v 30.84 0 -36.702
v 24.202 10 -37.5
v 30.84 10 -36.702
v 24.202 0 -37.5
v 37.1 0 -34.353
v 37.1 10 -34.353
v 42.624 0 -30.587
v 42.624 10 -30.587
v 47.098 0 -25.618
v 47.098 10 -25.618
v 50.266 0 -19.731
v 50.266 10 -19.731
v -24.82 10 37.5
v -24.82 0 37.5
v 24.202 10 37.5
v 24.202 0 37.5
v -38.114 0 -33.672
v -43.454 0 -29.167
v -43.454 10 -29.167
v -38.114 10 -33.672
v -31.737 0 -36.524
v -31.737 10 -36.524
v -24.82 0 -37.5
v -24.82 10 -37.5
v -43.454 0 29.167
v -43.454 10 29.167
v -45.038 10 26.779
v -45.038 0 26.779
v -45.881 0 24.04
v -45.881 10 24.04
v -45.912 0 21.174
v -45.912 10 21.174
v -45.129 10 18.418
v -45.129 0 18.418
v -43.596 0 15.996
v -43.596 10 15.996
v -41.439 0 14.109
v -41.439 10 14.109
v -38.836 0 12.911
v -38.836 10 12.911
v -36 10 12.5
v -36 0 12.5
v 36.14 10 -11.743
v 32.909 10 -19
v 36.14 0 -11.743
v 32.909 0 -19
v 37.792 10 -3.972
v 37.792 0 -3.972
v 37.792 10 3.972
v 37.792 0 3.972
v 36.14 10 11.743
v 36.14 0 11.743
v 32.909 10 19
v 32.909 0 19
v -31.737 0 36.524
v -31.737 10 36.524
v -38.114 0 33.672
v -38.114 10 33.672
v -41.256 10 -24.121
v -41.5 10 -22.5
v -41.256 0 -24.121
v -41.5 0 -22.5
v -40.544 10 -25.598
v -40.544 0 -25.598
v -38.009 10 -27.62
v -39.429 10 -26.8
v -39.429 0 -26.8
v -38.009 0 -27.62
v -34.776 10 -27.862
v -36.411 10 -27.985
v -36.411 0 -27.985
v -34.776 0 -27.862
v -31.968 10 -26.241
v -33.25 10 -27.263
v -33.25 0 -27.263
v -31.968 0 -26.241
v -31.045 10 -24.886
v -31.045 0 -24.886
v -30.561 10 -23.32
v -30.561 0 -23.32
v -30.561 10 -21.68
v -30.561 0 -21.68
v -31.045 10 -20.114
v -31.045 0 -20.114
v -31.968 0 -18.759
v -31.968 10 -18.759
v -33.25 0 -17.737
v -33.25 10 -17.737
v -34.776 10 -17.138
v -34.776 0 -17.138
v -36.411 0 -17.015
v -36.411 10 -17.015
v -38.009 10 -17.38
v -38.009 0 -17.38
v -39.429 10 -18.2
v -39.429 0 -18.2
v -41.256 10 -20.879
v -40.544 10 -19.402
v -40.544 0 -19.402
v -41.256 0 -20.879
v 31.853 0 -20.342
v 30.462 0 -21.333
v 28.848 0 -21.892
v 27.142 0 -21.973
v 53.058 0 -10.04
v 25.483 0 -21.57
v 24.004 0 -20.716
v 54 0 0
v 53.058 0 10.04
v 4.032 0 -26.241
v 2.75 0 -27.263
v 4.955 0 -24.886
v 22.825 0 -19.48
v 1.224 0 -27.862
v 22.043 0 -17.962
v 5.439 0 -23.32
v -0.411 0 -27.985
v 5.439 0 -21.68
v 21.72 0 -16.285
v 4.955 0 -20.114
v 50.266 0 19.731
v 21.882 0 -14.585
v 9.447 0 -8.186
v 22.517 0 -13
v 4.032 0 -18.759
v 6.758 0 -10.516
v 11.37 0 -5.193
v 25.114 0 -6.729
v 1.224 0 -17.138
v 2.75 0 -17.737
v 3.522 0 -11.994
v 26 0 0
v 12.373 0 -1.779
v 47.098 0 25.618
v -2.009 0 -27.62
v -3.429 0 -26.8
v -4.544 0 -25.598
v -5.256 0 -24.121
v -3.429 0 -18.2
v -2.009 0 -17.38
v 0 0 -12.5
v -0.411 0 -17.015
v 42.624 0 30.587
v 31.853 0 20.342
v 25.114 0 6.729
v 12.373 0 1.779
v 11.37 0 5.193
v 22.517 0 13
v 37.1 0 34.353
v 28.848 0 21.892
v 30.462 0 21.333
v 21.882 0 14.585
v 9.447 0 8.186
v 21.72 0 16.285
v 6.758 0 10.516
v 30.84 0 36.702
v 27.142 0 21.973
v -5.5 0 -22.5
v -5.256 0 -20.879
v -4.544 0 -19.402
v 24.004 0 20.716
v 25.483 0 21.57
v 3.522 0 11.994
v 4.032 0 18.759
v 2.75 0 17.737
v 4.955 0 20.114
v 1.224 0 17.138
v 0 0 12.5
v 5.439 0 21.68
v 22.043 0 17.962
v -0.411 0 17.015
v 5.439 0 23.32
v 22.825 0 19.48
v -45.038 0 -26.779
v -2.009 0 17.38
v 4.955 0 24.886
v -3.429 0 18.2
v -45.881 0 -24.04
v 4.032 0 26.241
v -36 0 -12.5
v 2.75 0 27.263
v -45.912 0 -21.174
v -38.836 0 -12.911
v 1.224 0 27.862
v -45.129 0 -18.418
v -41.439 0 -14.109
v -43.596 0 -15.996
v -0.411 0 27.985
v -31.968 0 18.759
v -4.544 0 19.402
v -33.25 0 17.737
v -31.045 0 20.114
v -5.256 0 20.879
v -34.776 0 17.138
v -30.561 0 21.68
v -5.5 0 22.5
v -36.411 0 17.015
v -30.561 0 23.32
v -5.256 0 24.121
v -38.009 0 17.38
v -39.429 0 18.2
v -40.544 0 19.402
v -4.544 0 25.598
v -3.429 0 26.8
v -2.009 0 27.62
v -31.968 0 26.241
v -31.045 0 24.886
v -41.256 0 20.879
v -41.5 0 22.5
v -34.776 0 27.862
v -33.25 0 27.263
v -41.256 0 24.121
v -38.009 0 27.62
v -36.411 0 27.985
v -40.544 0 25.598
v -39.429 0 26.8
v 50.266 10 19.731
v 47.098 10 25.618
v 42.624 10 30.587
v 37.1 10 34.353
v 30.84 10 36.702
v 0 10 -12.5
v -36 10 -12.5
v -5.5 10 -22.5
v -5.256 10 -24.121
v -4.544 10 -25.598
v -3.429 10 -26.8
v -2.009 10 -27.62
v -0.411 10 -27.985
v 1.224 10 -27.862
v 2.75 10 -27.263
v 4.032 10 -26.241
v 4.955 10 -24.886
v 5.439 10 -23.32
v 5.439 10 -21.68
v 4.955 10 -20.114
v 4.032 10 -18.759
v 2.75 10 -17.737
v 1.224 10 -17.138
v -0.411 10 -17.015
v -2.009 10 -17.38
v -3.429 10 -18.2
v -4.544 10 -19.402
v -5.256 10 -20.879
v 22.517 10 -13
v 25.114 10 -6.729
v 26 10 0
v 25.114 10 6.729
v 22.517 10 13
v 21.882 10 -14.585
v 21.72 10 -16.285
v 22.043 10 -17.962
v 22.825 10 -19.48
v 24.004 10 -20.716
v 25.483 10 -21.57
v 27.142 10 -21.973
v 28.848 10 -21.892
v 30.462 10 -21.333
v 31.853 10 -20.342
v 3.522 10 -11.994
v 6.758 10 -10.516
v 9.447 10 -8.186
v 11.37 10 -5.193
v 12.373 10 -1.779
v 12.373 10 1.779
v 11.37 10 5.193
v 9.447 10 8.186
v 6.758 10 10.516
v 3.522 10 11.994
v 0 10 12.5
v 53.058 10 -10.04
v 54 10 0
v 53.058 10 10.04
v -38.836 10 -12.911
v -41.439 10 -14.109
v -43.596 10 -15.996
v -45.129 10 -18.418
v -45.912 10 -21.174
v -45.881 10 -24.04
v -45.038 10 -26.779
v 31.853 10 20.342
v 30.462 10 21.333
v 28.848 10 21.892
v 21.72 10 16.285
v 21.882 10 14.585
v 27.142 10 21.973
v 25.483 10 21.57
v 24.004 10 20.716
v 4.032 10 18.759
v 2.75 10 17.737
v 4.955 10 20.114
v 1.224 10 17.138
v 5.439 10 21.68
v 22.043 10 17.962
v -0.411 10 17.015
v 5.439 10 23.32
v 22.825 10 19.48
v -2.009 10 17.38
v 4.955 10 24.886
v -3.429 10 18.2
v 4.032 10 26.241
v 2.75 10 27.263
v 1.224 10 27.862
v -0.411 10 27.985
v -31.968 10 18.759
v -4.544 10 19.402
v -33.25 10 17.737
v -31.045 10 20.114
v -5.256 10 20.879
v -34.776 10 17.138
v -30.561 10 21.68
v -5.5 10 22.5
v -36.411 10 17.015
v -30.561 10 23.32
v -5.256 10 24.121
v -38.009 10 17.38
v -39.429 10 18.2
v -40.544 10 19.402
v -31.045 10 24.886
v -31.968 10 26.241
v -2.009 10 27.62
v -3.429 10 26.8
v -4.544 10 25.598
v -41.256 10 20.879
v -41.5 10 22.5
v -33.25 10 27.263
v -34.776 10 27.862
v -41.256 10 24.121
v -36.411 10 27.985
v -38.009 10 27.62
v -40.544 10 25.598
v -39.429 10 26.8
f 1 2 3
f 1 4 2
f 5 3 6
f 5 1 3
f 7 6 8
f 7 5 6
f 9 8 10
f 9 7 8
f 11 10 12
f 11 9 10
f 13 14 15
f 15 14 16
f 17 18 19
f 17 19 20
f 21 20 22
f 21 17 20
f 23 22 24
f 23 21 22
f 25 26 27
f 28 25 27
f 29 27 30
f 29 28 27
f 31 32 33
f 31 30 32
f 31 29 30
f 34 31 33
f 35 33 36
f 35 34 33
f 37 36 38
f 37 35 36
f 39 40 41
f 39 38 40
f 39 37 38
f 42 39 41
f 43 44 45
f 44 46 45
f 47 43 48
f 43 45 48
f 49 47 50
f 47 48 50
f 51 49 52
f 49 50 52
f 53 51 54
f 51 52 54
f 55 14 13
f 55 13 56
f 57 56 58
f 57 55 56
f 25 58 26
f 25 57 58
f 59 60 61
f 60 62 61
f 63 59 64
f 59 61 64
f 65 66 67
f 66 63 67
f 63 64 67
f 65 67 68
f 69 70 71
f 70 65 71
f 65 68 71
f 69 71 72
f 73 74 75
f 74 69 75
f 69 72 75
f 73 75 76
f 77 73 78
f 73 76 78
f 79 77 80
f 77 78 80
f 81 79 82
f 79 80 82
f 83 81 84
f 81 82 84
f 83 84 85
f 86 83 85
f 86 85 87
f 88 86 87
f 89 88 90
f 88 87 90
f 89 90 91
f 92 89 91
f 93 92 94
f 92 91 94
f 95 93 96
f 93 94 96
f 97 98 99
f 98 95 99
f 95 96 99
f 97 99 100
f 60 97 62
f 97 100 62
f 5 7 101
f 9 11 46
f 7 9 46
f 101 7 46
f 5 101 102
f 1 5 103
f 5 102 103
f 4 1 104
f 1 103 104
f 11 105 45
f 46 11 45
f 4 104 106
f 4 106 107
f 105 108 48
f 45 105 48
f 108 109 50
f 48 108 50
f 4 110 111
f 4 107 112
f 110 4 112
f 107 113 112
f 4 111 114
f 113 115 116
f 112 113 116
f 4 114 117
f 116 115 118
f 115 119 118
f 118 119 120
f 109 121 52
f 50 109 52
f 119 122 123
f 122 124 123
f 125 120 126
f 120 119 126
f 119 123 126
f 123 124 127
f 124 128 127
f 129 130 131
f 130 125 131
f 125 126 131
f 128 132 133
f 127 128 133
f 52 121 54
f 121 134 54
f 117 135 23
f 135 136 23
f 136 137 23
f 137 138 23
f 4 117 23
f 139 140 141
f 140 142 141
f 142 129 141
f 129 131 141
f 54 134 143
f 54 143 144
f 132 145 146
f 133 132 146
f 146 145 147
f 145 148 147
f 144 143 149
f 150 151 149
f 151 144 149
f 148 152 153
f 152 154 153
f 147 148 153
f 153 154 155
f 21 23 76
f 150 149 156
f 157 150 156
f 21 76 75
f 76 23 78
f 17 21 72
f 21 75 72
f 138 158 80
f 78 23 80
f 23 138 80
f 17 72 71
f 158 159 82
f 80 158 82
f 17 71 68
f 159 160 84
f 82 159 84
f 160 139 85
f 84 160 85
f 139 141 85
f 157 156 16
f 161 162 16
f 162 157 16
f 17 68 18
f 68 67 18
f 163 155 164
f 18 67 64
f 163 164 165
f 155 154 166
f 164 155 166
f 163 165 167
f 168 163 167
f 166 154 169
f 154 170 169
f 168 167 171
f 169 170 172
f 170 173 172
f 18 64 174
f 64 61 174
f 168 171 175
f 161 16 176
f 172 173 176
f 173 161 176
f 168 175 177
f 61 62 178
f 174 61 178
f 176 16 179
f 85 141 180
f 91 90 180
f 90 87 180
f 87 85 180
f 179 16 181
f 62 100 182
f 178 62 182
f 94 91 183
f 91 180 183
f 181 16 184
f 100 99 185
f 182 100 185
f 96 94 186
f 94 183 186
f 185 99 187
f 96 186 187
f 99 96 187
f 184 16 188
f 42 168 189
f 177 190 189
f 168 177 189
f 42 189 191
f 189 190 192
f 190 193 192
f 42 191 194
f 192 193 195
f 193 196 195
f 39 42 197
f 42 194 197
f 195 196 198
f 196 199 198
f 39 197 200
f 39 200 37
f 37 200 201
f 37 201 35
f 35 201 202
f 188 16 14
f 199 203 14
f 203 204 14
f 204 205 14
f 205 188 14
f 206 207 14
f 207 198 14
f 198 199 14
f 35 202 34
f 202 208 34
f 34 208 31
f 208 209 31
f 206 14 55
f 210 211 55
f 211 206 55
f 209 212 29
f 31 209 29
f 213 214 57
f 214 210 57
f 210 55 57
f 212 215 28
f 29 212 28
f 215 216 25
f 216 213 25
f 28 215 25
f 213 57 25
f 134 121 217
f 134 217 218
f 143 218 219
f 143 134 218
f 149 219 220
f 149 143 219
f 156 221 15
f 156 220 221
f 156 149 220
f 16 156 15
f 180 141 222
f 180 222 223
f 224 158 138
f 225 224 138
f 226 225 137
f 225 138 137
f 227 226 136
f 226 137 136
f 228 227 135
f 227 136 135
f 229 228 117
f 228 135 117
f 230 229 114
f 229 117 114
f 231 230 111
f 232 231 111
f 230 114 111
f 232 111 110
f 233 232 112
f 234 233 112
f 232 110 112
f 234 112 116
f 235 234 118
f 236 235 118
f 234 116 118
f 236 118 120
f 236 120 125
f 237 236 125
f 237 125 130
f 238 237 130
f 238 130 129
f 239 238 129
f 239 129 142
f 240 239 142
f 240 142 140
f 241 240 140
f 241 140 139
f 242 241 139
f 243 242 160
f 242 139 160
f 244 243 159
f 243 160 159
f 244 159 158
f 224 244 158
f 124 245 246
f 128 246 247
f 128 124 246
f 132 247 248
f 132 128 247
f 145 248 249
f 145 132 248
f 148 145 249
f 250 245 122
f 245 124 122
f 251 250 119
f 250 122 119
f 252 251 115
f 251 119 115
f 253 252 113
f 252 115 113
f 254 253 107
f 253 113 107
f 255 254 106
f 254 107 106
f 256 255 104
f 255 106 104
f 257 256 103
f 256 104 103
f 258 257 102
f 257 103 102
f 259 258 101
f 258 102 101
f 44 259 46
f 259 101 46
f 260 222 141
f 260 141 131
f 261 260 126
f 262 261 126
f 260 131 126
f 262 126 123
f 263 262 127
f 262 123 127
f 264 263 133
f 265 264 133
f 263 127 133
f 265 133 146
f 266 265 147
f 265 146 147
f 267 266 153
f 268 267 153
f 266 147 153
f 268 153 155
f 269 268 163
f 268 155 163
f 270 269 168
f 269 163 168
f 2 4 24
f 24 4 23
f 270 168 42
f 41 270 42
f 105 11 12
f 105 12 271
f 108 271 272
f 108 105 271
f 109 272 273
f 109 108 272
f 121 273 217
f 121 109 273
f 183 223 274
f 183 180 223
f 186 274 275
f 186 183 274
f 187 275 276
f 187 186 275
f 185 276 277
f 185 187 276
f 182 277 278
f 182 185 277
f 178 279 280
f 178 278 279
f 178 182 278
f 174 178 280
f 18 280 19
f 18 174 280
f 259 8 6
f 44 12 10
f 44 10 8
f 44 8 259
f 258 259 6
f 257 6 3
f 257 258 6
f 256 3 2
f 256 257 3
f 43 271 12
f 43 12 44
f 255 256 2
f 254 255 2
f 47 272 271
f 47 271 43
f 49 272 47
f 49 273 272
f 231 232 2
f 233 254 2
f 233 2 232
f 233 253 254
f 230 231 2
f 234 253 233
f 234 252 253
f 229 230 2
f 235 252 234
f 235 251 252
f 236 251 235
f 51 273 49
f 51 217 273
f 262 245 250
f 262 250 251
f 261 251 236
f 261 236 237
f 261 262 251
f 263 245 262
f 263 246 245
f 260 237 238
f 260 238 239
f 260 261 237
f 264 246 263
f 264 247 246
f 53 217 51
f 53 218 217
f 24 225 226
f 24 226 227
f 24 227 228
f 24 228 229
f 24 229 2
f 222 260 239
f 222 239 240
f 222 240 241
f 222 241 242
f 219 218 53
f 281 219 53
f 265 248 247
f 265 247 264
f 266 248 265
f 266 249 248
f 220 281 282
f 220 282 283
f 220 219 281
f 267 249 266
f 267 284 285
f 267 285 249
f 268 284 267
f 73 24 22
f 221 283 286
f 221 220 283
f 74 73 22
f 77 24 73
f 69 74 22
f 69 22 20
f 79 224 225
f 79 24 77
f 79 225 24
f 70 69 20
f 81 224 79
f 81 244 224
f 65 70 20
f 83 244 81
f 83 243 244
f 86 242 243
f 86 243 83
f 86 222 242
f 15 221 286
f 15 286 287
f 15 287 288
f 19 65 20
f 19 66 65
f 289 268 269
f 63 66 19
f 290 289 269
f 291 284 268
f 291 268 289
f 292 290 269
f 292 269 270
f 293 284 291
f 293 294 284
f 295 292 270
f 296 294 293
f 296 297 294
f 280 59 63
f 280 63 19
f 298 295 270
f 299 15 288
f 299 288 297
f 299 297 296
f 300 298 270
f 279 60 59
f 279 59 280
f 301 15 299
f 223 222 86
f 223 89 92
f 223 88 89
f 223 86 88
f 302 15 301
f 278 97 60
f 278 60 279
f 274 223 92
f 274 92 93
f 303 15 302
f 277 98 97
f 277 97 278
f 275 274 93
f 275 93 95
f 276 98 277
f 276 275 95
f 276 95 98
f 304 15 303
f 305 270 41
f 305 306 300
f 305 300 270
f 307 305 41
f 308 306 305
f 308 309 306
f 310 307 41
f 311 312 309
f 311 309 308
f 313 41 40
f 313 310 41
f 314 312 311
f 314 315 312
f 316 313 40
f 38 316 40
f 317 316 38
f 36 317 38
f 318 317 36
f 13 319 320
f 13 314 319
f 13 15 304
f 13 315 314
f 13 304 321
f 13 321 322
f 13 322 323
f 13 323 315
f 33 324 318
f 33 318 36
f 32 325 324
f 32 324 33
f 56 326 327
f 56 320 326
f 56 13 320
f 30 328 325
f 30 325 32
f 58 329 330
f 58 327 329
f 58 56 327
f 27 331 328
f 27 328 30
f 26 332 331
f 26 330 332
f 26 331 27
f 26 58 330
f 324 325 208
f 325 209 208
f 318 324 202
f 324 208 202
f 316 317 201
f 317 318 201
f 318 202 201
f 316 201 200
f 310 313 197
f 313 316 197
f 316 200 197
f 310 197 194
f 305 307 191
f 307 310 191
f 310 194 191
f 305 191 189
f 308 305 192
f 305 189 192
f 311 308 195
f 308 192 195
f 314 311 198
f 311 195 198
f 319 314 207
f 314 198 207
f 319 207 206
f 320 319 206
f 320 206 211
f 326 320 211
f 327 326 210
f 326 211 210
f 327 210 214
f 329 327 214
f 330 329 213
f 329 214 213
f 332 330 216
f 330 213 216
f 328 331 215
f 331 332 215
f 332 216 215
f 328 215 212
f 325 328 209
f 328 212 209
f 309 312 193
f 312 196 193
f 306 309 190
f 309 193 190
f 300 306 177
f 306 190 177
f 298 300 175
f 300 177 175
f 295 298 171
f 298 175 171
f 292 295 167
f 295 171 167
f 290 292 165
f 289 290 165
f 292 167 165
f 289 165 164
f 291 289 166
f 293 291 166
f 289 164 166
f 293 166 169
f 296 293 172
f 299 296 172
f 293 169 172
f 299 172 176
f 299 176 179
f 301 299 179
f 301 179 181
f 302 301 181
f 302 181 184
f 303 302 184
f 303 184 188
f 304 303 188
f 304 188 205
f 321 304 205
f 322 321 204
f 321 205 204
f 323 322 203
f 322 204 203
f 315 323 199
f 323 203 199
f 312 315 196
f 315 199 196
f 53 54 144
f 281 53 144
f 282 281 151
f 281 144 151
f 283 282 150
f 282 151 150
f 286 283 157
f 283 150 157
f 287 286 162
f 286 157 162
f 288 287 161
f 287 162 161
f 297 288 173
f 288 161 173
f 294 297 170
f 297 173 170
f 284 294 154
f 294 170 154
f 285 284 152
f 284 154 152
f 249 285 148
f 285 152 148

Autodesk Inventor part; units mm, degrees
ref_plane "YZ Plane" through (0, 0, 0) normal (1, 0, 0) x (0, 1, 0)
ref_plane "XZ Plane" through (0, 0, 0) normal (0, 1, 0) x (-1, 0, 0)
ref_plane "XY Plane" through (0, 0, 0) normal (0, 0, 1) x (1, 0, 0)
sketch "Sketch1" plane through (0, 0, 0) normal (0, 1, 0) x (-1, 0, 0)
  arc A0 (-50.2663, 19.7308) -> (-50.2663, -19.7308) centre (0, 0) ccw
  line L0 (24.8197, 37.5) -> (-24.2023, 37.5)
  line L1 (-24.2023, -37.5) -> (24.8197, -37.5)
  circle A1 centre (0, 0) radius 12.5
  circle A2 centre (0, -22.5) radius 5.5
  circle A3 centre (0, 22.5) radius 5.5
  arc A4 (-24.2023, 37.5) -> (-50.2663, 19.7308) centre (-24.2023, 9.5) ccw
  line L2 (-14, 0) -> (-38, 0)
  arc A5 (-50.2663, -19.7308) -> (-24.2023, -37.5) centre (-24.2023, -9.5) ccw
  line L3 (0, 0) -> (-36.2595, -20.9344)
  line L4 (0, 0) -> (-38.6065, 22.2895)
  circle A6 centre (-27.7128, 16) radius 6
  circle A7 centre (-27.7128, -16) radius 6
  arc A8 (-22.5167, 13) -> (-22.5167, -13) centre (0, 0) ccw
  arc A9 (-32.909, 19) -> (-32.909, -19) centre (0, 0) ccw
  line L5 (38.0847, -33.6906) -> (38.0847, -32.2803)
  line L6 (38.0847, 32.2803) -> (38.0847, 33.6906)
  arc A10 (36, 12.5) -> (43.4536, 29.1667) centre (36, 22.5) ccw
  arc A11 (43.4536, -29.1667) -> (36, -12.5) centre (36, -22.5) ccw
  line L7 (0, 12.5) -> (0, -12.5)
  arc A12 (3.9746, 26.3016) -> (3.6179, 25.7471) centre (24.8197, 12.5) ccw
  arc A13 (-0.1803, 12.4987) -> (0, 9.5026) centre (24.8197, 12.5) ccw
  arc A14 (1.3171, -21.0223) -> (3.9746, -26.3016) centre (24.8197, -12.5) ccw
  arc A15 (24.8197, -37.5) -> (43.4536, -29.1667) centre (24.8197, -12.5) ccw
  arc A16 (0, -9.5026) -> (-0.1803, -12.4987) centre (24.8197, -12.5) ccw
  arc A17 (43.4536, 29.1667) -> (24.8197, 37.5) centre (24.8197, 12.5) ccw
  line L8 (0, 12.5) -> (36, 12.5)
  line L9 (49.8197, 12.5) -> (55, 12.5)
  line L10 (0, -12.5) -> (36, -12.5)
  line L11 (49.8197, -12.5) -> (57, -12.5)
  arc A18 (24.8197, -12.5) -> (29.6533, -12.0283) centre (24.8197, 12.5) ccw
  arc A19 (36.8095, -9.4373) -> (38.0847, -8.6906) centre (24.8197, 12.5) ccw
  arc A20 (-24.2389, 20.892) -> (-27.7128, 16) centre (0, 0) ccw
  arc A21 (-30.2125, -10.5455) -> (-24.2389, -20.892) centre (0, 0) ccw
  circle A22 centre (36, 22.5) radius 5.5
  circle A23 centre (36, -22.5) radius 5.5
  dimension "d5" = 11
  dimension "d6" = 11
  dimension "d0" = 108
  dimension "d4" = 25
  dimension "d7" = 45
  dimension "d8" = 22.5
  dimension "d9" = 37.5
  dimension "d10" = 37.5
  dimension "d13" = 30
  dimension "d14" = 30
  dimension "d15" = 12
  dimension "d16" = 12
  dimension "d17" = 20
  dimension "d18" = 20
  dimension "d19" = 36
  dimension "d20" = 36
  dimension "d23" = 11
  dimension "d24" = 11
extrude "Extrusion1" add sketch "Sketch1" along normal blind 10 contours A4 L0 A17 A10 L8 A1 L4 A6 A9 A7 L3 L10 A11 A15 L1 A5 A0 | A1 L3 A8 L4
equation "\"d5\" = d6"
equation "\"d8\" = 0.5 * d7"
equation "\"d9\" = 0.5 * d1"
equation "\"d10\" = d9"
equation "\"d16\" = d15"
equation "\"d18\" = d17"
equation "\"d1\" = 75"
